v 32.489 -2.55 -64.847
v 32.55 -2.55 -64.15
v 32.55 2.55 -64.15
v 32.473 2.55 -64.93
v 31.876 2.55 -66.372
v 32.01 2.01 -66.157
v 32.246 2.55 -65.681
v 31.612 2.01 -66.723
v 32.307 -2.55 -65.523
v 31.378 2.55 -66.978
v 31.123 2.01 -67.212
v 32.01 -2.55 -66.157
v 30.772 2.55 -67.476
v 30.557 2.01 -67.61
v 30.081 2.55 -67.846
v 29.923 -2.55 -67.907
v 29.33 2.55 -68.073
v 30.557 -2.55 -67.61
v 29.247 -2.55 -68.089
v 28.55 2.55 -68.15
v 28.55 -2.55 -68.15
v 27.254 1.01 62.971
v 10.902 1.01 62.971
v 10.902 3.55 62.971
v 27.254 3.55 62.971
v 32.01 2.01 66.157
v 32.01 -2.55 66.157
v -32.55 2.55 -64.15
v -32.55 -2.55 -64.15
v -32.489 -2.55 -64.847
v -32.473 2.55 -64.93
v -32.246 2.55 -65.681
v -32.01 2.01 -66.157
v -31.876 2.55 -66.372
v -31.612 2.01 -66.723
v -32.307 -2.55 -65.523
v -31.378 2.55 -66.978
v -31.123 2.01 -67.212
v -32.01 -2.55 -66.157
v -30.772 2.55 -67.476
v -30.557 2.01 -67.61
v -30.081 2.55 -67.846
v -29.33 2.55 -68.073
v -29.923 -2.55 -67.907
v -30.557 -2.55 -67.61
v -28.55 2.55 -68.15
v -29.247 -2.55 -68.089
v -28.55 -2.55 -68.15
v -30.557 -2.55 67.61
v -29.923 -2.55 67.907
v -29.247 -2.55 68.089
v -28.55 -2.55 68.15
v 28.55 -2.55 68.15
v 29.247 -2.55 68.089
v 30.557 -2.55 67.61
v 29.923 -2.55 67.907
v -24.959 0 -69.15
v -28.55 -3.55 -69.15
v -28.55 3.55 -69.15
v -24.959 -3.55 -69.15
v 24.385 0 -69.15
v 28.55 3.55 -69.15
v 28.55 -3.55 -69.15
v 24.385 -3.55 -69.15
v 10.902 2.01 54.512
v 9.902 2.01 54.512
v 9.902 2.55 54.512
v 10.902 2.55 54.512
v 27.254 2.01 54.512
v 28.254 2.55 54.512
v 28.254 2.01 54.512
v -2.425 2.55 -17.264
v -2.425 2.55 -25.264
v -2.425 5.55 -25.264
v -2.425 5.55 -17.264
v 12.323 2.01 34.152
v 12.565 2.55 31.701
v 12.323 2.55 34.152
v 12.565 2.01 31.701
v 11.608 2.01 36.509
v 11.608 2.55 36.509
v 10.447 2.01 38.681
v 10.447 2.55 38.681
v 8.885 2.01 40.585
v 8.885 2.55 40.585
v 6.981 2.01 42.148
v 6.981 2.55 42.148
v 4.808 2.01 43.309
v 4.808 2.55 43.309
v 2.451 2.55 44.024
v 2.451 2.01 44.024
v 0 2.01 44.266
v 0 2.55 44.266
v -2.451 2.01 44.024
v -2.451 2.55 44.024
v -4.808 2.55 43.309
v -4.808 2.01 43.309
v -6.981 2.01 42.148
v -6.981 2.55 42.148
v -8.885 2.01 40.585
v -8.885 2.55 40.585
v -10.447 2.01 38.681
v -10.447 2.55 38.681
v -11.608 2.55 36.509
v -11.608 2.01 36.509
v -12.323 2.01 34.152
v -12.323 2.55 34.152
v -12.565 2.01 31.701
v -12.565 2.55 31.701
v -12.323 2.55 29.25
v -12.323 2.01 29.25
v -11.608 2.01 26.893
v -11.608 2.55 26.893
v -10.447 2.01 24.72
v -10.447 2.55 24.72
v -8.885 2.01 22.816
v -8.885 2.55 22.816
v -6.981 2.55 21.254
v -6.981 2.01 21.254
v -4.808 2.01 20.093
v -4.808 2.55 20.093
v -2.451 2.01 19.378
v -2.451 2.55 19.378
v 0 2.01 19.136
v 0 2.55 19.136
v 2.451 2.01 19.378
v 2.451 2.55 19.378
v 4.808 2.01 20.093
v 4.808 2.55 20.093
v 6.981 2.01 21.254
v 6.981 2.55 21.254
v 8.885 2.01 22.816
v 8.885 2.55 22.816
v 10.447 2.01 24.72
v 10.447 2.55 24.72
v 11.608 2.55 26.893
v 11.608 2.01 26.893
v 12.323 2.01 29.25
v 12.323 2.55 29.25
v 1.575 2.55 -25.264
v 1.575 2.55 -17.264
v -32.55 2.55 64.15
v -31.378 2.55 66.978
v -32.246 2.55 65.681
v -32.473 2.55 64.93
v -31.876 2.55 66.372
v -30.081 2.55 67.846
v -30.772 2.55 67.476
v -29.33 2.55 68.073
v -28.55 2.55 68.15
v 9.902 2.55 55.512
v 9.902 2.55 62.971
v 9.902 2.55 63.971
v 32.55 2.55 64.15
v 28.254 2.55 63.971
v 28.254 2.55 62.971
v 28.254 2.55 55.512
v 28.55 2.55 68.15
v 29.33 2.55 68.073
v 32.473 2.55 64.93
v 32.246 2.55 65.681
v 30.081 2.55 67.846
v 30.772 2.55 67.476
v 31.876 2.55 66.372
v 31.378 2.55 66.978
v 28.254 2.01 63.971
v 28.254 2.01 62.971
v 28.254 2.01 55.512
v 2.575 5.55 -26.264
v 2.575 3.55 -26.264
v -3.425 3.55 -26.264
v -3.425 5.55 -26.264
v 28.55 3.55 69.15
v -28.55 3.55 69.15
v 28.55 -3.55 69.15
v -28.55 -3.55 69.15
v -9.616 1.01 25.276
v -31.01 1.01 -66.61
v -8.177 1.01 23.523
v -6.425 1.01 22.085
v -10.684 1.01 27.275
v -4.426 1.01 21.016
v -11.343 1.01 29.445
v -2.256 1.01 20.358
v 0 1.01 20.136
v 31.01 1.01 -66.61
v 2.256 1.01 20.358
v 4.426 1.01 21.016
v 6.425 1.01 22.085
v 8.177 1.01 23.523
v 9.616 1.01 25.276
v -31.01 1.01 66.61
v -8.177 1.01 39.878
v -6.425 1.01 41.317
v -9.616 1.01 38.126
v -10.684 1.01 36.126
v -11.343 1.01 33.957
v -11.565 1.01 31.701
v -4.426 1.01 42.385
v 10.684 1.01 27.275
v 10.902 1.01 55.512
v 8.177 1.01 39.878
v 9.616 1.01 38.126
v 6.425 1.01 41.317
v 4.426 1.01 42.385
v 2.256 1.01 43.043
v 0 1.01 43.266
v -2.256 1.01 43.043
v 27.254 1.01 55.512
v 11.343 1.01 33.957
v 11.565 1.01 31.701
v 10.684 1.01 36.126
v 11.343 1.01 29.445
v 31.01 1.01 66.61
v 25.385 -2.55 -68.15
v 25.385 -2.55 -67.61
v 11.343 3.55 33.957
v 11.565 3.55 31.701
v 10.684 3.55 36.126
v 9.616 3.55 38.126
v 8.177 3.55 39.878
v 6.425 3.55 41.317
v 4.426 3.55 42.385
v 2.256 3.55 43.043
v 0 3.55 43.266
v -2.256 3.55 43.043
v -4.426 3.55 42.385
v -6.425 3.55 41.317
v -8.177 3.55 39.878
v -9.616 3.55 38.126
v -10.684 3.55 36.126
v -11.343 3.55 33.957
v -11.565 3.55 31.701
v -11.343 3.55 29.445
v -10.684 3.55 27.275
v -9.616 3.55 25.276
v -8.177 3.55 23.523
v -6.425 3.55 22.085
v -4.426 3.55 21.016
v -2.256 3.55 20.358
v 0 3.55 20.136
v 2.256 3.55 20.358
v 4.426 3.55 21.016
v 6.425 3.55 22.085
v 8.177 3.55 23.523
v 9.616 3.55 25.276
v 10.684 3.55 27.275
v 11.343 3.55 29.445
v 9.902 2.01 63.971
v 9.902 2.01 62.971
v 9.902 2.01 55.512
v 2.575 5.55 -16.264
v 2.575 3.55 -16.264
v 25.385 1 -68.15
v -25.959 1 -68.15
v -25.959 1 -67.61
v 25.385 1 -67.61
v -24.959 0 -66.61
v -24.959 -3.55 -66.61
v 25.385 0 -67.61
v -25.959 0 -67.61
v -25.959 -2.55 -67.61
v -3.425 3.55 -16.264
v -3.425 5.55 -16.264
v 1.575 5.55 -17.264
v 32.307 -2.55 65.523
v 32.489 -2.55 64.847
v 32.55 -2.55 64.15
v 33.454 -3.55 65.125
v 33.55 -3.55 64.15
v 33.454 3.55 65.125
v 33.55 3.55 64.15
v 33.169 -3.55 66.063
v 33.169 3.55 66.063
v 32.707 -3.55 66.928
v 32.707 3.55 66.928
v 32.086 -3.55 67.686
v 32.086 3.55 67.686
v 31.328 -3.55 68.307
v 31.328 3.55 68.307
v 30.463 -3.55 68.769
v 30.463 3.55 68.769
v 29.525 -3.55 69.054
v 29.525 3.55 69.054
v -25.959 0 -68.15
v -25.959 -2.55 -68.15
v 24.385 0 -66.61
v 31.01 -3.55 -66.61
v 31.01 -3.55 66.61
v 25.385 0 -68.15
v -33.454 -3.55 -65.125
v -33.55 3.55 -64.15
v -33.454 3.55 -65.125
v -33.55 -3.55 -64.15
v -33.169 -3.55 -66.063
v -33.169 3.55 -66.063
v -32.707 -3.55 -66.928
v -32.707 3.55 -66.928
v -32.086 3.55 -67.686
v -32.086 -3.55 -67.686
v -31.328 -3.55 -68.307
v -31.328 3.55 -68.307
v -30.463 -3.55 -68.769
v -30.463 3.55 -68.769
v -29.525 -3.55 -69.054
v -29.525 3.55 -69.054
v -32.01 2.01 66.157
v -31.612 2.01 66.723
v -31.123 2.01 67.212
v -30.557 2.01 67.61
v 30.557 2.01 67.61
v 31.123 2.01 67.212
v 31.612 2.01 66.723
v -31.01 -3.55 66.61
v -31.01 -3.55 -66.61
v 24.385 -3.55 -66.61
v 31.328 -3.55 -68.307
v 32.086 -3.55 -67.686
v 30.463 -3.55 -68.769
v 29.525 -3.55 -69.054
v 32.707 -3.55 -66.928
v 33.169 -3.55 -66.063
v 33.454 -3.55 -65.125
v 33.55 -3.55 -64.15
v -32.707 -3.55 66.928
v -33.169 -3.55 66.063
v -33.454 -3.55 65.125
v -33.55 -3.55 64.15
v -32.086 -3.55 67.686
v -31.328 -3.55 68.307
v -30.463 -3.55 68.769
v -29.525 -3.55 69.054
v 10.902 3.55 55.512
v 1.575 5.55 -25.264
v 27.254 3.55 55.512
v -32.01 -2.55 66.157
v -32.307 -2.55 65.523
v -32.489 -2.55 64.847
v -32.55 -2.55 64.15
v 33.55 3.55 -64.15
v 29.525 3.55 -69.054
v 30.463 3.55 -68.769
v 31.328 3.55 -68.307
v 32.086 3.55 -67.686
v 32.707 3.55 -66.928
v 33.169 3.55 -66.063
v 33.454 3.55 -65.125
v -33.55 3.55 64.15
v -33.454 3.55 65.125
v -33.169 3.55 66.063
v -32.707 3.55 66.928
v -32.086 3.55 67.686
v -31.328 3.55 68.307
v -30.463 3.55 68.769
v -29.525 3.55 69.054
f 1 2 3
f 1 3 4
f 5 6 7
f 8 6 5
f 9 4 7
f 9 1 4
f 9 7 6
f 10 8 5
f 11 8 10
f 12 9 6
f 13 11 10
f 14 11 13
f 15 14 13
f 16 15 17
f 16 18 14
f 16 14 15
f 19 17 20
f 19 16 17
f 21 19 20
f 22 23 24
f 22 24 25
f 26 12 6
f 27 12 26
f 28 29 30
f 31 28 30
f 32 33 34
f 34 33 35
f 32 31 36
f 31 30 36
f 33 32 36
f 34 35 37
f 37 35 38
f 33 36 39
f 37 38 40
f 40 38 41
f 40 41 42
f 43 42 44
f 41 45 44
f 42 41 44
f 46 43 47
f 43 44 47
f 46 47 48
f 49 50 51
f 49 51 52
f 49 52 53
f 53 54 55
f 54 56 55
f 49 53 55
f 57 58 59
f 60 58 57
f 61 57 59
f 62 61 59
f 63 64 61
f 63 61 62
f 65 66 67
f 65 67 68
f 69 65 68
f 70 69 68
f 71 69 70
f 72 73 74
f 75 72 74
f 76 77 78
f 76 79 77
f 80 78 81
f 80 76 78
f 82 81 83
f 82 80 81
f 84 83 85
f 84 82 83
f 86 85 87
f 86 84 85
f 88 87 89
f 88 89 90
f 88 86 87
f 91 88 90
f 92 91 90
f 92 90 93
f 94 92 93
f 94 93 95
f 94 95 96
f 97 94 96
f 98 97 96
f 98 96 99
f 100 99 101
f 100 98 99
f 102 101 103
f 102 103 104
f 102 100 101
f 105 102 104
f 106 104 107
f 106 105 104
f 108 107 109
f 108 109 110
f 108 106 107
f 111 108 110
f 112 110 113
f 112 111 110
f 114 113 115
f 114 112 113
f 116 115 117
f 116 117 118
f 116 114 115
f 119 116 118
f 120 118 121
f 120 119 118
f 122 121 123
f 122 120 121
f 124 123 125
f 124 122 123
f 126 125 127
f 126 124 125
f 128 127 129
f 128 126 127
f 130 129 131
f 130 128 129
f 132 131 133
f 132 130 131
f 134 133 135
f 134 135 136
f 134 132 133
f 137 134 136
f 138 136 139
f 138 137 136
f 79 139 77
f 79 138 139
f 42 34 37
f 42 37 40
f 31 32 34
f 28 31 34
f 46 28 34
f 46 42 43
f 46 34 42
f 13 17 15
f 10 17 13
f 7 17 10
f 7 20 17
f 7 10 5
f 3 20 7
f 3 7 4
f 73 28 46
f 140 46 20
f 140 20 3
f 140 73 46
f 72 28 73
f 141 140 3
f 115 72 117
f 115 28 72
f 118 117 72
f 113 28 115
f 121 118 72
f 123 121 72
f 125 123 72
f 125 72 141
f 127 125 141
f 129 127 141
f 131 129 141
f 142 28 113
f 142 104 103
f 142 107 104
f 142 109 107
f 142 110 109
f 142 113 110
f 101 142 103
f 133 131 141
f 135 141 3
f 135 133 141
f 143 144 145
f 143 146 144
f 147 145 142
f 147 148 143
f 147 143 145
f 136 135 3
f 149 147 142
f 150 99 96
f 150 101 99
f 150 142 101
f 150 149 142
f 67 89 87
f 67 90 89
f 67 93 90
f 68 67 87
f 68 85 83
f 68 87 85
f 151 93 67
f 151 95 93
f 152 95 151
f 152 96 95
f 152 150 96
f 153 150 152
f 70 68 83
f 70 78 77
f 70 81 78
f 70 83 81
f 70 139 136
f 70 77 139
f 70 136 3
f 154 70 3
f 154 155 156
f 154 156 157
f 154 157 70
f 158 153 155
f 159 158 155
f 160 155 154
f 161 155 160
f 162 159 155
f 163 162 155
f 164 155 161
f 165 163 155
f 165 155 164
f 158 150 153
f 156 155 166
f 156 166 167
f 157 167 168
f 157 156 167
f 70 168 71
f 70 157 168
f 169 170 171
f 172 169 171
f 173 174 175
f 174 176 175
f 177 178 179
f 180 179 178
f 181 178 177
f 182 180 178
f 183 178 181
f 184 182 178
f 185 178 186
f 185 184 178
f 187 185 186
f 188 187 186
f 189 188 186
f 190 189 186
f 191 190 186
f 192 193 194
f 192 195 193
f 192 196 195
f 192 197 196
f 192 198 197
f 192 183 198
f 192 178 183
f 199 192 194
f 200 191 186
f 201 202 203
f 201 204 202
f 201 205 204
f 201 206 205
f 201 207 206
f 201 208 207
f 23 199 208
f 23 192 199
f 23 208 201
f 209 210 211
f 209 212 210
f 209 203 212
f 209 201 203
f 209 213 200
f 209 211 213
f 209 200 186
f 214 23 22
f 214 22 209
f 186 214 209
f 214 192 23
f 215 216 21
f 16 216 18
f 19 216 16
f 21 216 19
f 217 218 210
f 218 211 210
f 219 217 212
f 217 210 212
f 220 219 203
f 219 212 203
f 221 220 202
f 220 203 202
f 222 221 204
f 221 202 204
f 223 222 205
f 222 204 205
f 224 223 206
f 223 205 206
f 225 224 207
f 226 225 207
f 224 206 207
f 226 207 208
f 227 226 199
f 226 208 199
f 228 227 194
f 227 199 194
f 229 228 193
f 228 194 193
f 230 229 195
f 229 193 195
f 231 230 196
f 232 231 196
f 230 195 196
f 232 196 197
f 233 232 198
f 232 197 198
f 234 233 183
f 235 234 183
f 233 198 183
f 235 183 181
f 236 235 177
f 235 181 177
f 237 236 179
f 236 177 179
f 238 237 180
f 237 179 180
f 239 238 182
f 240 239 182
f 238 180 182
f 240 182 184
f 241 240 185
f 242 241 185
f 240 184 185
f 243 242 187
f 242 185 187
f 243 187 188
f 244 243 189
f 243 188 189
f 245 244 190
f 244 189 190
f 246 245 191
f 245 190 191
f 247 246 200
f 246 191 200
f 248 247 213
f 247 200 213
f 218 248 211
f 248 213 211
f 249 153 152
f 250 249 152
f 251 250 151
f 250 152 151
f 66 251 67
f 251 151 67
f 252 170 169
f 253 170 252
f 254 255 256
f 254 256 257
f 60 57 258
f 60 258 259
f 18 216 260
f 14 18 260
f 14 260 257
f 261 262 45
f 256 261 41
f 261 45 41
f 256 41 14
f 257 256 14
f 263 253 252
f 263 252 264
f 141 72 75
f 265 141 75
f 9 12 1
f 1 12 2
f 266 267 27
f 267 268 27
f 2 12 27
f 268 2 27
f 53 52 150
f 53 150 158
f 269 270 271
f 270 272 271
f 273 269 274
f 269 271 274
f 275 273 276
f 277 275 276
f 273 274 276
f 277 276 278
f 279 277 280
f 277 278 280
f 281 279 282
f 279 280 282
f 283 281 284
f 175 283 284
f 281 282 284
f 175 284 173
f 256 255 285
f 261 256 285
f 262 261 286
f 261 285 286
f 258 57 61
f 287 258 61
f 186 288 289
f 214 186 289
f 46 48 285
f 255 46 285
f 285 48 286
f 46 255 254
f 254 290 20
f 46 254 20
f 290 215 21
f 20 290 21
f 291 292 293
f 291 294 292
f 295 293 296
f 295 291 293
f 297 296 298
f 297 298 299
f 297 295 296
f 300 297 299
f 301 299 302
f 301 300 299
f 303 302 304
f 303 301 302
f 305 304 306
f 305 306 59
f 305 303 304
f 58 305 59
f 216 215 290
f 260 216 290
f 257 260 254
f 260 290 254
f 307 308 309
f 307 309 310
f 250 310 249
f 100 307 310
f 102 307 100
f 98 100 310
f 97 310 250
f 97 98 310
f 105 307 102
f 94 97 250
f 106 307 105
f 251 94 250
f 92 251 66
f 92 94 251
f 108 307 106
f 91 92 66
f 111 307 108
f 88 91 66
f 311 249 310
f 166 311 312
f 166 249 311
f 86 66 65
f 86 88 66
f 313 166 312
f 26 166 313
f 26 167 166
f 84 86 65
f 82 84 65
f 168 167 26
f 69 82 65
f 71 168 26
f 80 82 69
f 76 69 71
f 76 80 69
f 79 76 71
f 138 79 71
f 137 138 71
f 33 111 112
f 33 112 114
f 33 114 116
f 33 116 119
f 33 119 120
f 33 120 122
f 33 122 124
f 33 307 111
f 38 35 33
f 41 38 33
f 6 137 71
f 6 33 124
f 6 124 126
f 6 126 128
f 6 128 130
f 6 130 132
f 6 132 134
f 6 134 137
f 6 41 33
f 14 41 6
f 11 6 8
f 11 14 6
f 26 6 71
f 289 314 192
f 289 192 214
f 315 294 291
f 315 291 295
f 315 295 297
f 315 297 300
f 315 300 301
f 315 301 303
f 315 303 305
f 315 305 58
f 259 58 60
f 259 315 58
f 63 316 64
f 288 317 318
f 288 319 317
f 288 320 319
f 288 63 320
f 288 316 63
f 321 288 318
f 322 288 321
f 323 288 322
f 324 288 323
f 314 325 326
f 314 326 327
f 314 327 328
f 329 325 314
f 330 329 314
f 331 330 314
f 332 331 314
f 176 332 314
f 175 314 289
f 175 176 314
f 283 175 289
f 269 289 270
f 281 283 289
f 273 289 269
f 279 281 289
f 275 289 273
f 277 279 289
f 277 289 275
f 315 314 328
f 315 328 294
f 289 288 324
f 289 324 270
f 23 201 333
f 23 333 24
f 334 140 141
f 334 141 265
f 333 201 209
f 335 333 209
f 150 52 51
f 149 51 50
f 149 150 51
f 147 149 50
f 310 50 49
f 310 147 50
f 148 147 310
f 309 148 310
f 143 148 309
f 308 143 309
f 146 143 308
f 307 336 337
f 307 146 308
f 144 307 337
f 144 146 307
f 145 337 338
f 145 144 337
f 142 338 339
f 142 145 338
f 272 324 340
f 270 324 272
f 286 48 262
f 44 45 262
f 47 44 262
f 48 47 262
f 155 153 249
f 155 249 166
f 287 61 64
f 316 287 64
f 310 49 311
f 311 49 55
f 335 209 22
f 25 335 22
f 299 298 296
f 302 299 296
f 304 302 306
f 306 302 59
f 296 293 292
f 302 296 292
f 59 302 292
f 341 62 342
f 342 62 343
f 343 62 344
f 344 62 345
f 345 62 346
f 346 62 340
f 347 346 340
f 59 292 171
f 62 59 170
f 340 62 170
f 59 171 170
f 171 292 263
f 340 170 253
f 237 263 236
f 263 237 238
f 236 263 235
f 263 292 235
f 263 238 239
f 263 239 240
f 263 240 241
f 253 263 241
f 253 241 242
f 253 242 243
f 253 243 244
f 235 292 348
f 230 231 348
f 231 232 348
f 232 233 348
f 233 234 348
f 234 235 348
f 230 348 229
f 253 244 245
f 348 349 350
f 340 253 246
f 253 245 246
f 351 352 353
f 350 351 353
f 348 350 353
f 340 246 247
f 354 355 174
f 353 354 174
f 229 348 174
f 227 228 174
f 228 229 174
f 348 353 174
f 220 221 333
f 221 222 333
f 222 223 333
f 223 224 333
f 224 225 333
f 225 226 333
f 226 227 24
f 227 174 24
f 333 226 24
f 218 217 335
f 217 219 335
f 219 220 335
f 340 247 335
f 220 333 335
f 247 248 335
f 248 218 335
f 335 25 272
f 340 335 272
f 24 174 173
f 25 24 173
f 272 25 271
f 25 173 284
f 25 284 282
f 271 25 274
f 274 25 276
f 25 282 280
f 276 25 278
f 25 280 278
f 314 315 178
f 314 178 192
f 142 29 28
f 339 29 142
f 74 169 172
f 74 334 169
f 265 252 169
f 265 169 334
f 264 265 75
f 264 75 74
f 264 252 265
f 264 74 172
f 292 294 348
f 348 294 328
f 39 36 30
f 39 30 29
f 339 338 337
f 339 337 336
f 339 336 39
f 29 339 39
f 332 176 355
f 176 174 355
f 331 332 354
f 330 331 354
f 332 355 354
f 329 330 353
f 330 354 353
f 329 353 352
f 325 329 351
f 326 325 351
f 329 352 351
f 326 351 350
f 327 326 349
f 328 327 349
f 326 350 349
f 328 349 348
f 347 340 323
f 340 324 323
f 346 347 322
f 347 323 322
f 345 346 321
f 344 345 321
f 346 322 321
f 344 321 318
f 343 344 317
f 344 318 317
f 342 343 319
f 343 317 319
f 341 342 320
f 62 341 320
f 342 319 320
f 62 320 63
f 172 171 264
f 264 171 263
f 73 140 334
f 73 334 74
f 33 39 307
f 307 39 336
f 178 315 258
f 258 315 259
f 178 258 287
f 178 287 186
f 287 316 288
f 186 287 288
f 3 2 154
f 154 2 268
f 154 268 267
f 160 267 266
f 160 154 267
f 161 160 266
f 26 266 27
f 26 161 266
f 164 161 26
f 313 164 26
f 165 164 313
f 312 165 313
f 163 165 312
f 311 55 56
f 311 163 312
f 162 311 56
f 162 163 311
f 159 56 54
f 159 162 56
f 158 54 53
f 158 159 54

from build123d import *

# Parameters (mm, degrees)
F0_W          = 67.1
F0_H          = 138.3
F1_DEPTH      = 3.55
F2_T          = -2.54
F3_R          = 5
F4_W          = 16.3524625823
F4_H          = 7.4590183794
F5_DEPTH      = 12.5
F6_W          = 49.3442639709
F6_H          = 3.55
F7_DEPTH      = 12.5
F8_R          = 11.5647163982
F9_DEPTH      = 12.5
F10_W         = 6
F10_H         = 10
F11_DEPTH     = 2
F12_T         = 1
F12_T3_DEPTH  = 12
F12_T5_DEPTH  = 8
F12_T7_DEPTH  = 4.54
F12_T9_DEPTH  = 4.54
F12_T11_DEPTH = 6.56
F12_T13_DEPTH = 64.02
F12_T15_DEPTH = 135.22


# Not quite as in the source:
# - a shell that OpenCascade refuses in one call is made with other operations: the cavity is built on its own and cut out


with BuildPart() as f1:
    # F0 (on Front) → F1 (new body, symmetric)
    with BuildSketch(Plane.XZ):
        Rectangle(F0_W, F0_H)
    extrude(amount=F1_DEPTH, both=True)

    # F2
    f2_openings = [f1.faces().sort_by_distance(p)[0] for p in [
        (0, -3.55, 0),
    ]]
    offset(amount=F2_T, openings=f2_openings)

    # F3
    f3_edges = [f1.edges().sort_by_distance(p)[0] for p in [
        (-33.55, 0, 69.15),
        (-33.55, 0, -69.15),
        (33.55, 0, 69.15),
        (33.55, 0, -69.15),
    ]]
    fillet(f3_edges, radius=F3_R)

    # F4 (on face) → F5 (cut, symmetric)
    with BuildSketch(Plane.XZ.offset(-1.01)):
        with Locations((19.0778714605, 59.2418070883)):
            Rectangle(F4_W, F4_H)
    extrude(amount=F5_DEPTH, both=True, mode=Mode.SUBTRACT)

    # F6 (on face) → F7 (cut, symmetric)
    with BuildSketch(Plane(origin=(0, 0, -69.15), x_dir=(1, 0, 0), z_dir=(0, 0, -1))):
        with Locations((-0.2868864685, 1.775)):
            Rectangle(F6_W, F6_H)
    extrude(amount=F7_DEPTH, both=True, mode=Mode.SUBTRACT)

    # F8 (on face) → F9 (cut, symmetric)
    with BuildSketch(Plane.XZ.offset(-1.01)):
        with Locations((0, 31.700823456)):
            Circle(F8_R)
    extrude(amount=F9_DEPTH, both=True, mode=Mode.SUBTRACT)

    # F10 (on face) → F11 (join)
    with BuildSketch(Plane(origin=(0, 3.55, 0), x_dir=(-1, 0, 0), z_dir=(0, 1, 0))):
        with Locations((0.4249104531, -21.26386761)):
            Rectangle(F10_W, F10_H)
    extrude(amount=F11_DEPTH)

    # F12: shell of thickness 1, made by hand


with BuildPart() as f12_core1:
    # F12_t2: copy of F1
    add(f1.part)

    # the walls: a layer under each face that stays
    f12_faces = [f12_core1.faces().sort_by_distance(p)[0] for p in [
        (0, 0, 69.15),
        (0, 3.55, 0),
        (32.0855339059, 0, 67.6855339059),
        (-32.0855339059, 0, 67.6855339059),
        (-31.3133333333, -3.55, -64.54),
        (33.55, 0, 0),
        (-33.55, 0, 0),
        (32.0855339059, 0, -67.6855339059),
        (-32.0855339059, 0, -67.6855339059),
        (-19.0333333333, 2.3666666667, -69.15),
        (-3.4249104531, 4.55, -21.26386761),
        (-0.4249104531, 4.55, -26.26386761),
        (2.5750895469, 4.55, -21.26386761),
        (-0.4249104531, 4.55, -16.26386761),
        (-11.5647163982, 2.28, 31.700823456),
        (19.0778714605, 2.28, 62.971316278),
        (27.2541027516, 2.28, 59.2418070883),
        (10.9016401693, 2.28, 59.2418070883),
        (19.0778714605, 2.28, 55.5122978985),
        (24.3852455169, -1.775, -67.88),
        (-20.6733333333, 0.25, -66.61),
        (31.01, -1.27, 0),
        (0, -1.27, 66.61),
        (-31.01, -1.27, 0),
        (-24.959018454, -1.775, -67.88),
        (-0.2868864685, 0, -67.88),
        (0, 1.01, 0),
    ]]
    thicken(f12_faces, amount=-F12_T, mode=Mode.SUBTRACT)

    # F12_s4 → F12_t3 (cut)
    with BuildSketch(Plane.XY.offset(-27.26386761)):
        Polygon((-3.4349104531, 3.56), (-3.4249104531, 2.55), (-2.4249104531, 2.55), (-2.4249104531, 3.55), align=None)
        Polygon((2.5850895469, 3.56), (2.5750895469, 2.55), (1.5750895469, 2.55), (1.5750895469, 3.55), align=None)
    extrude(amount=F12_T3_DEPTH, mode=Mode.SUBTRACT)

    # F12_s6 → F12_t5 (cut)
    with BuildSketch(Plane.YZ.offset(-4.4249104531)):
        Polygon((3.56, -26.27386761), (2.55, -26.26386761), (2.55, -25.26386761), (3.55, -25.26386761), align=None)
        Polygon((3.56, -16.25386761), (2.55, -16.26386761), (2.55, -17.26386761), (3.55, -17.26386761), align=None)
    extrude(amount=F12_T5_DEPTH, mode=Mode.SUBTRACT)

    # F12_s8 → F12_t7 (cut)
    with BuildSketch(Plane.XZ.offset(-4.55)):
        Polygon((27.2441027516, 62.961316278), (27.2541027516, 63.971316278), (28.2541027516, 63.971316278), (28.2541027516, 62.971316278), align=None)
        Polygon((10.9116401693, 62.961316278), (10.9016401693, 63.971316278), (9.9016401693, 63.971316278), (9.9016401693, 62.971316278), align=None)
        Polygon((27.2441027516, 55.5222978985), (28.2541027516, 55.5122978985), (28.2541027516, 54.5122978985), (27.2541027516, 54.5122978985), align=None)
        Polygon((10.9116401693, 55.5222978985), (9.9016401693, 55.5122978985), (9.9016401693, 54.5122978985), (10.9016401693, 54.5122978985), align=None)
    extrude(amount=F12_T7_DEPTH, mode=Mode.SUBTRACT)

    # F12_s10 → F12_t9 (cut)
    with BuildSketch(Plane.XY.offset(-70.15)):
        Polygon((24.3752455169, -0.01), (25.3852455169, 0), (25.3852455169, 1), (24.3852455169, 1), align=None)
        Polygon((-24.949018454, -0.01), (-25.959018454, 0), (-25.959018454, 1), (-24.959018454, 1), align=None)
    extrude(amount=F12_T9_DEPTH, mode=Mode.SUBTRACT)

    # F12_s12 → F12_t11 (cut)
    with BuildSketch(Plane.XZ.offset(-2.01)):
        Polygon((31, -66.6), (31.01, -67.61), (32.01, -67.61), (32.01, -66.61), align=None)
        Polygon((-31, -66.6), (-31.01, -67.61), (-32.01, -67.61), (-32.01, -66.61), align=None)
        Polygon((31, 66.6), (32.01, 66.61), (32.01, 67.61), (31.01, 67.61), align=None)
        Polygon((-31, 66.6), (-31.01, 67.61), (-32.01, 67.61), (-32.01, 66.61), align=None)
    extrude(amount=F12_T11_DEPTH, mode=Mode.SUBTRACT)

    # F12_s14 → F12_t13 (cut)
    with BuildSketch(Plane.YZ.offset(-32.01)):
        Polygon((1, -66.6), (1.01, -67.61), (2.01, -67.61), (2.01, -66.61), align=None)
        Polygon((1, 66.6), (1.01, 67.61), (2.01, 67.61), (2.01, 66.61), align=None)
    extrude(amount=F12_T13_DEPTH, mode=Mode.SUBTRACT)

    # F12_s16 → F12_t15 (cut)
    with BuildSketch(Plane.XY.offset(-67.61)):
        Polygon((31, 1), (32.01, 1.01), (32.01, 2.01), (31.01, 2.01), align=None)
        Polygon((-31, 1), (-32.01, 1.01), (-32.01, 2.01), (-31.01, 2.01), align=None)
    extrude(amount=F12_T15_DEPTH, mode=Mode.SUBTRACT)


with BuildPart() as f1_1:
    add(f1.part)

    # what is left inside the walls is the cavity
    f12_cavity = [f12_core1.part.solids().sort_by_distance(p)[0] for p in [
        (-16.275, 2.54, 22.716667),
    ]]
    add(f12_cavity, mode=Mode.SUBTRACT)


solid = f1_1.part
